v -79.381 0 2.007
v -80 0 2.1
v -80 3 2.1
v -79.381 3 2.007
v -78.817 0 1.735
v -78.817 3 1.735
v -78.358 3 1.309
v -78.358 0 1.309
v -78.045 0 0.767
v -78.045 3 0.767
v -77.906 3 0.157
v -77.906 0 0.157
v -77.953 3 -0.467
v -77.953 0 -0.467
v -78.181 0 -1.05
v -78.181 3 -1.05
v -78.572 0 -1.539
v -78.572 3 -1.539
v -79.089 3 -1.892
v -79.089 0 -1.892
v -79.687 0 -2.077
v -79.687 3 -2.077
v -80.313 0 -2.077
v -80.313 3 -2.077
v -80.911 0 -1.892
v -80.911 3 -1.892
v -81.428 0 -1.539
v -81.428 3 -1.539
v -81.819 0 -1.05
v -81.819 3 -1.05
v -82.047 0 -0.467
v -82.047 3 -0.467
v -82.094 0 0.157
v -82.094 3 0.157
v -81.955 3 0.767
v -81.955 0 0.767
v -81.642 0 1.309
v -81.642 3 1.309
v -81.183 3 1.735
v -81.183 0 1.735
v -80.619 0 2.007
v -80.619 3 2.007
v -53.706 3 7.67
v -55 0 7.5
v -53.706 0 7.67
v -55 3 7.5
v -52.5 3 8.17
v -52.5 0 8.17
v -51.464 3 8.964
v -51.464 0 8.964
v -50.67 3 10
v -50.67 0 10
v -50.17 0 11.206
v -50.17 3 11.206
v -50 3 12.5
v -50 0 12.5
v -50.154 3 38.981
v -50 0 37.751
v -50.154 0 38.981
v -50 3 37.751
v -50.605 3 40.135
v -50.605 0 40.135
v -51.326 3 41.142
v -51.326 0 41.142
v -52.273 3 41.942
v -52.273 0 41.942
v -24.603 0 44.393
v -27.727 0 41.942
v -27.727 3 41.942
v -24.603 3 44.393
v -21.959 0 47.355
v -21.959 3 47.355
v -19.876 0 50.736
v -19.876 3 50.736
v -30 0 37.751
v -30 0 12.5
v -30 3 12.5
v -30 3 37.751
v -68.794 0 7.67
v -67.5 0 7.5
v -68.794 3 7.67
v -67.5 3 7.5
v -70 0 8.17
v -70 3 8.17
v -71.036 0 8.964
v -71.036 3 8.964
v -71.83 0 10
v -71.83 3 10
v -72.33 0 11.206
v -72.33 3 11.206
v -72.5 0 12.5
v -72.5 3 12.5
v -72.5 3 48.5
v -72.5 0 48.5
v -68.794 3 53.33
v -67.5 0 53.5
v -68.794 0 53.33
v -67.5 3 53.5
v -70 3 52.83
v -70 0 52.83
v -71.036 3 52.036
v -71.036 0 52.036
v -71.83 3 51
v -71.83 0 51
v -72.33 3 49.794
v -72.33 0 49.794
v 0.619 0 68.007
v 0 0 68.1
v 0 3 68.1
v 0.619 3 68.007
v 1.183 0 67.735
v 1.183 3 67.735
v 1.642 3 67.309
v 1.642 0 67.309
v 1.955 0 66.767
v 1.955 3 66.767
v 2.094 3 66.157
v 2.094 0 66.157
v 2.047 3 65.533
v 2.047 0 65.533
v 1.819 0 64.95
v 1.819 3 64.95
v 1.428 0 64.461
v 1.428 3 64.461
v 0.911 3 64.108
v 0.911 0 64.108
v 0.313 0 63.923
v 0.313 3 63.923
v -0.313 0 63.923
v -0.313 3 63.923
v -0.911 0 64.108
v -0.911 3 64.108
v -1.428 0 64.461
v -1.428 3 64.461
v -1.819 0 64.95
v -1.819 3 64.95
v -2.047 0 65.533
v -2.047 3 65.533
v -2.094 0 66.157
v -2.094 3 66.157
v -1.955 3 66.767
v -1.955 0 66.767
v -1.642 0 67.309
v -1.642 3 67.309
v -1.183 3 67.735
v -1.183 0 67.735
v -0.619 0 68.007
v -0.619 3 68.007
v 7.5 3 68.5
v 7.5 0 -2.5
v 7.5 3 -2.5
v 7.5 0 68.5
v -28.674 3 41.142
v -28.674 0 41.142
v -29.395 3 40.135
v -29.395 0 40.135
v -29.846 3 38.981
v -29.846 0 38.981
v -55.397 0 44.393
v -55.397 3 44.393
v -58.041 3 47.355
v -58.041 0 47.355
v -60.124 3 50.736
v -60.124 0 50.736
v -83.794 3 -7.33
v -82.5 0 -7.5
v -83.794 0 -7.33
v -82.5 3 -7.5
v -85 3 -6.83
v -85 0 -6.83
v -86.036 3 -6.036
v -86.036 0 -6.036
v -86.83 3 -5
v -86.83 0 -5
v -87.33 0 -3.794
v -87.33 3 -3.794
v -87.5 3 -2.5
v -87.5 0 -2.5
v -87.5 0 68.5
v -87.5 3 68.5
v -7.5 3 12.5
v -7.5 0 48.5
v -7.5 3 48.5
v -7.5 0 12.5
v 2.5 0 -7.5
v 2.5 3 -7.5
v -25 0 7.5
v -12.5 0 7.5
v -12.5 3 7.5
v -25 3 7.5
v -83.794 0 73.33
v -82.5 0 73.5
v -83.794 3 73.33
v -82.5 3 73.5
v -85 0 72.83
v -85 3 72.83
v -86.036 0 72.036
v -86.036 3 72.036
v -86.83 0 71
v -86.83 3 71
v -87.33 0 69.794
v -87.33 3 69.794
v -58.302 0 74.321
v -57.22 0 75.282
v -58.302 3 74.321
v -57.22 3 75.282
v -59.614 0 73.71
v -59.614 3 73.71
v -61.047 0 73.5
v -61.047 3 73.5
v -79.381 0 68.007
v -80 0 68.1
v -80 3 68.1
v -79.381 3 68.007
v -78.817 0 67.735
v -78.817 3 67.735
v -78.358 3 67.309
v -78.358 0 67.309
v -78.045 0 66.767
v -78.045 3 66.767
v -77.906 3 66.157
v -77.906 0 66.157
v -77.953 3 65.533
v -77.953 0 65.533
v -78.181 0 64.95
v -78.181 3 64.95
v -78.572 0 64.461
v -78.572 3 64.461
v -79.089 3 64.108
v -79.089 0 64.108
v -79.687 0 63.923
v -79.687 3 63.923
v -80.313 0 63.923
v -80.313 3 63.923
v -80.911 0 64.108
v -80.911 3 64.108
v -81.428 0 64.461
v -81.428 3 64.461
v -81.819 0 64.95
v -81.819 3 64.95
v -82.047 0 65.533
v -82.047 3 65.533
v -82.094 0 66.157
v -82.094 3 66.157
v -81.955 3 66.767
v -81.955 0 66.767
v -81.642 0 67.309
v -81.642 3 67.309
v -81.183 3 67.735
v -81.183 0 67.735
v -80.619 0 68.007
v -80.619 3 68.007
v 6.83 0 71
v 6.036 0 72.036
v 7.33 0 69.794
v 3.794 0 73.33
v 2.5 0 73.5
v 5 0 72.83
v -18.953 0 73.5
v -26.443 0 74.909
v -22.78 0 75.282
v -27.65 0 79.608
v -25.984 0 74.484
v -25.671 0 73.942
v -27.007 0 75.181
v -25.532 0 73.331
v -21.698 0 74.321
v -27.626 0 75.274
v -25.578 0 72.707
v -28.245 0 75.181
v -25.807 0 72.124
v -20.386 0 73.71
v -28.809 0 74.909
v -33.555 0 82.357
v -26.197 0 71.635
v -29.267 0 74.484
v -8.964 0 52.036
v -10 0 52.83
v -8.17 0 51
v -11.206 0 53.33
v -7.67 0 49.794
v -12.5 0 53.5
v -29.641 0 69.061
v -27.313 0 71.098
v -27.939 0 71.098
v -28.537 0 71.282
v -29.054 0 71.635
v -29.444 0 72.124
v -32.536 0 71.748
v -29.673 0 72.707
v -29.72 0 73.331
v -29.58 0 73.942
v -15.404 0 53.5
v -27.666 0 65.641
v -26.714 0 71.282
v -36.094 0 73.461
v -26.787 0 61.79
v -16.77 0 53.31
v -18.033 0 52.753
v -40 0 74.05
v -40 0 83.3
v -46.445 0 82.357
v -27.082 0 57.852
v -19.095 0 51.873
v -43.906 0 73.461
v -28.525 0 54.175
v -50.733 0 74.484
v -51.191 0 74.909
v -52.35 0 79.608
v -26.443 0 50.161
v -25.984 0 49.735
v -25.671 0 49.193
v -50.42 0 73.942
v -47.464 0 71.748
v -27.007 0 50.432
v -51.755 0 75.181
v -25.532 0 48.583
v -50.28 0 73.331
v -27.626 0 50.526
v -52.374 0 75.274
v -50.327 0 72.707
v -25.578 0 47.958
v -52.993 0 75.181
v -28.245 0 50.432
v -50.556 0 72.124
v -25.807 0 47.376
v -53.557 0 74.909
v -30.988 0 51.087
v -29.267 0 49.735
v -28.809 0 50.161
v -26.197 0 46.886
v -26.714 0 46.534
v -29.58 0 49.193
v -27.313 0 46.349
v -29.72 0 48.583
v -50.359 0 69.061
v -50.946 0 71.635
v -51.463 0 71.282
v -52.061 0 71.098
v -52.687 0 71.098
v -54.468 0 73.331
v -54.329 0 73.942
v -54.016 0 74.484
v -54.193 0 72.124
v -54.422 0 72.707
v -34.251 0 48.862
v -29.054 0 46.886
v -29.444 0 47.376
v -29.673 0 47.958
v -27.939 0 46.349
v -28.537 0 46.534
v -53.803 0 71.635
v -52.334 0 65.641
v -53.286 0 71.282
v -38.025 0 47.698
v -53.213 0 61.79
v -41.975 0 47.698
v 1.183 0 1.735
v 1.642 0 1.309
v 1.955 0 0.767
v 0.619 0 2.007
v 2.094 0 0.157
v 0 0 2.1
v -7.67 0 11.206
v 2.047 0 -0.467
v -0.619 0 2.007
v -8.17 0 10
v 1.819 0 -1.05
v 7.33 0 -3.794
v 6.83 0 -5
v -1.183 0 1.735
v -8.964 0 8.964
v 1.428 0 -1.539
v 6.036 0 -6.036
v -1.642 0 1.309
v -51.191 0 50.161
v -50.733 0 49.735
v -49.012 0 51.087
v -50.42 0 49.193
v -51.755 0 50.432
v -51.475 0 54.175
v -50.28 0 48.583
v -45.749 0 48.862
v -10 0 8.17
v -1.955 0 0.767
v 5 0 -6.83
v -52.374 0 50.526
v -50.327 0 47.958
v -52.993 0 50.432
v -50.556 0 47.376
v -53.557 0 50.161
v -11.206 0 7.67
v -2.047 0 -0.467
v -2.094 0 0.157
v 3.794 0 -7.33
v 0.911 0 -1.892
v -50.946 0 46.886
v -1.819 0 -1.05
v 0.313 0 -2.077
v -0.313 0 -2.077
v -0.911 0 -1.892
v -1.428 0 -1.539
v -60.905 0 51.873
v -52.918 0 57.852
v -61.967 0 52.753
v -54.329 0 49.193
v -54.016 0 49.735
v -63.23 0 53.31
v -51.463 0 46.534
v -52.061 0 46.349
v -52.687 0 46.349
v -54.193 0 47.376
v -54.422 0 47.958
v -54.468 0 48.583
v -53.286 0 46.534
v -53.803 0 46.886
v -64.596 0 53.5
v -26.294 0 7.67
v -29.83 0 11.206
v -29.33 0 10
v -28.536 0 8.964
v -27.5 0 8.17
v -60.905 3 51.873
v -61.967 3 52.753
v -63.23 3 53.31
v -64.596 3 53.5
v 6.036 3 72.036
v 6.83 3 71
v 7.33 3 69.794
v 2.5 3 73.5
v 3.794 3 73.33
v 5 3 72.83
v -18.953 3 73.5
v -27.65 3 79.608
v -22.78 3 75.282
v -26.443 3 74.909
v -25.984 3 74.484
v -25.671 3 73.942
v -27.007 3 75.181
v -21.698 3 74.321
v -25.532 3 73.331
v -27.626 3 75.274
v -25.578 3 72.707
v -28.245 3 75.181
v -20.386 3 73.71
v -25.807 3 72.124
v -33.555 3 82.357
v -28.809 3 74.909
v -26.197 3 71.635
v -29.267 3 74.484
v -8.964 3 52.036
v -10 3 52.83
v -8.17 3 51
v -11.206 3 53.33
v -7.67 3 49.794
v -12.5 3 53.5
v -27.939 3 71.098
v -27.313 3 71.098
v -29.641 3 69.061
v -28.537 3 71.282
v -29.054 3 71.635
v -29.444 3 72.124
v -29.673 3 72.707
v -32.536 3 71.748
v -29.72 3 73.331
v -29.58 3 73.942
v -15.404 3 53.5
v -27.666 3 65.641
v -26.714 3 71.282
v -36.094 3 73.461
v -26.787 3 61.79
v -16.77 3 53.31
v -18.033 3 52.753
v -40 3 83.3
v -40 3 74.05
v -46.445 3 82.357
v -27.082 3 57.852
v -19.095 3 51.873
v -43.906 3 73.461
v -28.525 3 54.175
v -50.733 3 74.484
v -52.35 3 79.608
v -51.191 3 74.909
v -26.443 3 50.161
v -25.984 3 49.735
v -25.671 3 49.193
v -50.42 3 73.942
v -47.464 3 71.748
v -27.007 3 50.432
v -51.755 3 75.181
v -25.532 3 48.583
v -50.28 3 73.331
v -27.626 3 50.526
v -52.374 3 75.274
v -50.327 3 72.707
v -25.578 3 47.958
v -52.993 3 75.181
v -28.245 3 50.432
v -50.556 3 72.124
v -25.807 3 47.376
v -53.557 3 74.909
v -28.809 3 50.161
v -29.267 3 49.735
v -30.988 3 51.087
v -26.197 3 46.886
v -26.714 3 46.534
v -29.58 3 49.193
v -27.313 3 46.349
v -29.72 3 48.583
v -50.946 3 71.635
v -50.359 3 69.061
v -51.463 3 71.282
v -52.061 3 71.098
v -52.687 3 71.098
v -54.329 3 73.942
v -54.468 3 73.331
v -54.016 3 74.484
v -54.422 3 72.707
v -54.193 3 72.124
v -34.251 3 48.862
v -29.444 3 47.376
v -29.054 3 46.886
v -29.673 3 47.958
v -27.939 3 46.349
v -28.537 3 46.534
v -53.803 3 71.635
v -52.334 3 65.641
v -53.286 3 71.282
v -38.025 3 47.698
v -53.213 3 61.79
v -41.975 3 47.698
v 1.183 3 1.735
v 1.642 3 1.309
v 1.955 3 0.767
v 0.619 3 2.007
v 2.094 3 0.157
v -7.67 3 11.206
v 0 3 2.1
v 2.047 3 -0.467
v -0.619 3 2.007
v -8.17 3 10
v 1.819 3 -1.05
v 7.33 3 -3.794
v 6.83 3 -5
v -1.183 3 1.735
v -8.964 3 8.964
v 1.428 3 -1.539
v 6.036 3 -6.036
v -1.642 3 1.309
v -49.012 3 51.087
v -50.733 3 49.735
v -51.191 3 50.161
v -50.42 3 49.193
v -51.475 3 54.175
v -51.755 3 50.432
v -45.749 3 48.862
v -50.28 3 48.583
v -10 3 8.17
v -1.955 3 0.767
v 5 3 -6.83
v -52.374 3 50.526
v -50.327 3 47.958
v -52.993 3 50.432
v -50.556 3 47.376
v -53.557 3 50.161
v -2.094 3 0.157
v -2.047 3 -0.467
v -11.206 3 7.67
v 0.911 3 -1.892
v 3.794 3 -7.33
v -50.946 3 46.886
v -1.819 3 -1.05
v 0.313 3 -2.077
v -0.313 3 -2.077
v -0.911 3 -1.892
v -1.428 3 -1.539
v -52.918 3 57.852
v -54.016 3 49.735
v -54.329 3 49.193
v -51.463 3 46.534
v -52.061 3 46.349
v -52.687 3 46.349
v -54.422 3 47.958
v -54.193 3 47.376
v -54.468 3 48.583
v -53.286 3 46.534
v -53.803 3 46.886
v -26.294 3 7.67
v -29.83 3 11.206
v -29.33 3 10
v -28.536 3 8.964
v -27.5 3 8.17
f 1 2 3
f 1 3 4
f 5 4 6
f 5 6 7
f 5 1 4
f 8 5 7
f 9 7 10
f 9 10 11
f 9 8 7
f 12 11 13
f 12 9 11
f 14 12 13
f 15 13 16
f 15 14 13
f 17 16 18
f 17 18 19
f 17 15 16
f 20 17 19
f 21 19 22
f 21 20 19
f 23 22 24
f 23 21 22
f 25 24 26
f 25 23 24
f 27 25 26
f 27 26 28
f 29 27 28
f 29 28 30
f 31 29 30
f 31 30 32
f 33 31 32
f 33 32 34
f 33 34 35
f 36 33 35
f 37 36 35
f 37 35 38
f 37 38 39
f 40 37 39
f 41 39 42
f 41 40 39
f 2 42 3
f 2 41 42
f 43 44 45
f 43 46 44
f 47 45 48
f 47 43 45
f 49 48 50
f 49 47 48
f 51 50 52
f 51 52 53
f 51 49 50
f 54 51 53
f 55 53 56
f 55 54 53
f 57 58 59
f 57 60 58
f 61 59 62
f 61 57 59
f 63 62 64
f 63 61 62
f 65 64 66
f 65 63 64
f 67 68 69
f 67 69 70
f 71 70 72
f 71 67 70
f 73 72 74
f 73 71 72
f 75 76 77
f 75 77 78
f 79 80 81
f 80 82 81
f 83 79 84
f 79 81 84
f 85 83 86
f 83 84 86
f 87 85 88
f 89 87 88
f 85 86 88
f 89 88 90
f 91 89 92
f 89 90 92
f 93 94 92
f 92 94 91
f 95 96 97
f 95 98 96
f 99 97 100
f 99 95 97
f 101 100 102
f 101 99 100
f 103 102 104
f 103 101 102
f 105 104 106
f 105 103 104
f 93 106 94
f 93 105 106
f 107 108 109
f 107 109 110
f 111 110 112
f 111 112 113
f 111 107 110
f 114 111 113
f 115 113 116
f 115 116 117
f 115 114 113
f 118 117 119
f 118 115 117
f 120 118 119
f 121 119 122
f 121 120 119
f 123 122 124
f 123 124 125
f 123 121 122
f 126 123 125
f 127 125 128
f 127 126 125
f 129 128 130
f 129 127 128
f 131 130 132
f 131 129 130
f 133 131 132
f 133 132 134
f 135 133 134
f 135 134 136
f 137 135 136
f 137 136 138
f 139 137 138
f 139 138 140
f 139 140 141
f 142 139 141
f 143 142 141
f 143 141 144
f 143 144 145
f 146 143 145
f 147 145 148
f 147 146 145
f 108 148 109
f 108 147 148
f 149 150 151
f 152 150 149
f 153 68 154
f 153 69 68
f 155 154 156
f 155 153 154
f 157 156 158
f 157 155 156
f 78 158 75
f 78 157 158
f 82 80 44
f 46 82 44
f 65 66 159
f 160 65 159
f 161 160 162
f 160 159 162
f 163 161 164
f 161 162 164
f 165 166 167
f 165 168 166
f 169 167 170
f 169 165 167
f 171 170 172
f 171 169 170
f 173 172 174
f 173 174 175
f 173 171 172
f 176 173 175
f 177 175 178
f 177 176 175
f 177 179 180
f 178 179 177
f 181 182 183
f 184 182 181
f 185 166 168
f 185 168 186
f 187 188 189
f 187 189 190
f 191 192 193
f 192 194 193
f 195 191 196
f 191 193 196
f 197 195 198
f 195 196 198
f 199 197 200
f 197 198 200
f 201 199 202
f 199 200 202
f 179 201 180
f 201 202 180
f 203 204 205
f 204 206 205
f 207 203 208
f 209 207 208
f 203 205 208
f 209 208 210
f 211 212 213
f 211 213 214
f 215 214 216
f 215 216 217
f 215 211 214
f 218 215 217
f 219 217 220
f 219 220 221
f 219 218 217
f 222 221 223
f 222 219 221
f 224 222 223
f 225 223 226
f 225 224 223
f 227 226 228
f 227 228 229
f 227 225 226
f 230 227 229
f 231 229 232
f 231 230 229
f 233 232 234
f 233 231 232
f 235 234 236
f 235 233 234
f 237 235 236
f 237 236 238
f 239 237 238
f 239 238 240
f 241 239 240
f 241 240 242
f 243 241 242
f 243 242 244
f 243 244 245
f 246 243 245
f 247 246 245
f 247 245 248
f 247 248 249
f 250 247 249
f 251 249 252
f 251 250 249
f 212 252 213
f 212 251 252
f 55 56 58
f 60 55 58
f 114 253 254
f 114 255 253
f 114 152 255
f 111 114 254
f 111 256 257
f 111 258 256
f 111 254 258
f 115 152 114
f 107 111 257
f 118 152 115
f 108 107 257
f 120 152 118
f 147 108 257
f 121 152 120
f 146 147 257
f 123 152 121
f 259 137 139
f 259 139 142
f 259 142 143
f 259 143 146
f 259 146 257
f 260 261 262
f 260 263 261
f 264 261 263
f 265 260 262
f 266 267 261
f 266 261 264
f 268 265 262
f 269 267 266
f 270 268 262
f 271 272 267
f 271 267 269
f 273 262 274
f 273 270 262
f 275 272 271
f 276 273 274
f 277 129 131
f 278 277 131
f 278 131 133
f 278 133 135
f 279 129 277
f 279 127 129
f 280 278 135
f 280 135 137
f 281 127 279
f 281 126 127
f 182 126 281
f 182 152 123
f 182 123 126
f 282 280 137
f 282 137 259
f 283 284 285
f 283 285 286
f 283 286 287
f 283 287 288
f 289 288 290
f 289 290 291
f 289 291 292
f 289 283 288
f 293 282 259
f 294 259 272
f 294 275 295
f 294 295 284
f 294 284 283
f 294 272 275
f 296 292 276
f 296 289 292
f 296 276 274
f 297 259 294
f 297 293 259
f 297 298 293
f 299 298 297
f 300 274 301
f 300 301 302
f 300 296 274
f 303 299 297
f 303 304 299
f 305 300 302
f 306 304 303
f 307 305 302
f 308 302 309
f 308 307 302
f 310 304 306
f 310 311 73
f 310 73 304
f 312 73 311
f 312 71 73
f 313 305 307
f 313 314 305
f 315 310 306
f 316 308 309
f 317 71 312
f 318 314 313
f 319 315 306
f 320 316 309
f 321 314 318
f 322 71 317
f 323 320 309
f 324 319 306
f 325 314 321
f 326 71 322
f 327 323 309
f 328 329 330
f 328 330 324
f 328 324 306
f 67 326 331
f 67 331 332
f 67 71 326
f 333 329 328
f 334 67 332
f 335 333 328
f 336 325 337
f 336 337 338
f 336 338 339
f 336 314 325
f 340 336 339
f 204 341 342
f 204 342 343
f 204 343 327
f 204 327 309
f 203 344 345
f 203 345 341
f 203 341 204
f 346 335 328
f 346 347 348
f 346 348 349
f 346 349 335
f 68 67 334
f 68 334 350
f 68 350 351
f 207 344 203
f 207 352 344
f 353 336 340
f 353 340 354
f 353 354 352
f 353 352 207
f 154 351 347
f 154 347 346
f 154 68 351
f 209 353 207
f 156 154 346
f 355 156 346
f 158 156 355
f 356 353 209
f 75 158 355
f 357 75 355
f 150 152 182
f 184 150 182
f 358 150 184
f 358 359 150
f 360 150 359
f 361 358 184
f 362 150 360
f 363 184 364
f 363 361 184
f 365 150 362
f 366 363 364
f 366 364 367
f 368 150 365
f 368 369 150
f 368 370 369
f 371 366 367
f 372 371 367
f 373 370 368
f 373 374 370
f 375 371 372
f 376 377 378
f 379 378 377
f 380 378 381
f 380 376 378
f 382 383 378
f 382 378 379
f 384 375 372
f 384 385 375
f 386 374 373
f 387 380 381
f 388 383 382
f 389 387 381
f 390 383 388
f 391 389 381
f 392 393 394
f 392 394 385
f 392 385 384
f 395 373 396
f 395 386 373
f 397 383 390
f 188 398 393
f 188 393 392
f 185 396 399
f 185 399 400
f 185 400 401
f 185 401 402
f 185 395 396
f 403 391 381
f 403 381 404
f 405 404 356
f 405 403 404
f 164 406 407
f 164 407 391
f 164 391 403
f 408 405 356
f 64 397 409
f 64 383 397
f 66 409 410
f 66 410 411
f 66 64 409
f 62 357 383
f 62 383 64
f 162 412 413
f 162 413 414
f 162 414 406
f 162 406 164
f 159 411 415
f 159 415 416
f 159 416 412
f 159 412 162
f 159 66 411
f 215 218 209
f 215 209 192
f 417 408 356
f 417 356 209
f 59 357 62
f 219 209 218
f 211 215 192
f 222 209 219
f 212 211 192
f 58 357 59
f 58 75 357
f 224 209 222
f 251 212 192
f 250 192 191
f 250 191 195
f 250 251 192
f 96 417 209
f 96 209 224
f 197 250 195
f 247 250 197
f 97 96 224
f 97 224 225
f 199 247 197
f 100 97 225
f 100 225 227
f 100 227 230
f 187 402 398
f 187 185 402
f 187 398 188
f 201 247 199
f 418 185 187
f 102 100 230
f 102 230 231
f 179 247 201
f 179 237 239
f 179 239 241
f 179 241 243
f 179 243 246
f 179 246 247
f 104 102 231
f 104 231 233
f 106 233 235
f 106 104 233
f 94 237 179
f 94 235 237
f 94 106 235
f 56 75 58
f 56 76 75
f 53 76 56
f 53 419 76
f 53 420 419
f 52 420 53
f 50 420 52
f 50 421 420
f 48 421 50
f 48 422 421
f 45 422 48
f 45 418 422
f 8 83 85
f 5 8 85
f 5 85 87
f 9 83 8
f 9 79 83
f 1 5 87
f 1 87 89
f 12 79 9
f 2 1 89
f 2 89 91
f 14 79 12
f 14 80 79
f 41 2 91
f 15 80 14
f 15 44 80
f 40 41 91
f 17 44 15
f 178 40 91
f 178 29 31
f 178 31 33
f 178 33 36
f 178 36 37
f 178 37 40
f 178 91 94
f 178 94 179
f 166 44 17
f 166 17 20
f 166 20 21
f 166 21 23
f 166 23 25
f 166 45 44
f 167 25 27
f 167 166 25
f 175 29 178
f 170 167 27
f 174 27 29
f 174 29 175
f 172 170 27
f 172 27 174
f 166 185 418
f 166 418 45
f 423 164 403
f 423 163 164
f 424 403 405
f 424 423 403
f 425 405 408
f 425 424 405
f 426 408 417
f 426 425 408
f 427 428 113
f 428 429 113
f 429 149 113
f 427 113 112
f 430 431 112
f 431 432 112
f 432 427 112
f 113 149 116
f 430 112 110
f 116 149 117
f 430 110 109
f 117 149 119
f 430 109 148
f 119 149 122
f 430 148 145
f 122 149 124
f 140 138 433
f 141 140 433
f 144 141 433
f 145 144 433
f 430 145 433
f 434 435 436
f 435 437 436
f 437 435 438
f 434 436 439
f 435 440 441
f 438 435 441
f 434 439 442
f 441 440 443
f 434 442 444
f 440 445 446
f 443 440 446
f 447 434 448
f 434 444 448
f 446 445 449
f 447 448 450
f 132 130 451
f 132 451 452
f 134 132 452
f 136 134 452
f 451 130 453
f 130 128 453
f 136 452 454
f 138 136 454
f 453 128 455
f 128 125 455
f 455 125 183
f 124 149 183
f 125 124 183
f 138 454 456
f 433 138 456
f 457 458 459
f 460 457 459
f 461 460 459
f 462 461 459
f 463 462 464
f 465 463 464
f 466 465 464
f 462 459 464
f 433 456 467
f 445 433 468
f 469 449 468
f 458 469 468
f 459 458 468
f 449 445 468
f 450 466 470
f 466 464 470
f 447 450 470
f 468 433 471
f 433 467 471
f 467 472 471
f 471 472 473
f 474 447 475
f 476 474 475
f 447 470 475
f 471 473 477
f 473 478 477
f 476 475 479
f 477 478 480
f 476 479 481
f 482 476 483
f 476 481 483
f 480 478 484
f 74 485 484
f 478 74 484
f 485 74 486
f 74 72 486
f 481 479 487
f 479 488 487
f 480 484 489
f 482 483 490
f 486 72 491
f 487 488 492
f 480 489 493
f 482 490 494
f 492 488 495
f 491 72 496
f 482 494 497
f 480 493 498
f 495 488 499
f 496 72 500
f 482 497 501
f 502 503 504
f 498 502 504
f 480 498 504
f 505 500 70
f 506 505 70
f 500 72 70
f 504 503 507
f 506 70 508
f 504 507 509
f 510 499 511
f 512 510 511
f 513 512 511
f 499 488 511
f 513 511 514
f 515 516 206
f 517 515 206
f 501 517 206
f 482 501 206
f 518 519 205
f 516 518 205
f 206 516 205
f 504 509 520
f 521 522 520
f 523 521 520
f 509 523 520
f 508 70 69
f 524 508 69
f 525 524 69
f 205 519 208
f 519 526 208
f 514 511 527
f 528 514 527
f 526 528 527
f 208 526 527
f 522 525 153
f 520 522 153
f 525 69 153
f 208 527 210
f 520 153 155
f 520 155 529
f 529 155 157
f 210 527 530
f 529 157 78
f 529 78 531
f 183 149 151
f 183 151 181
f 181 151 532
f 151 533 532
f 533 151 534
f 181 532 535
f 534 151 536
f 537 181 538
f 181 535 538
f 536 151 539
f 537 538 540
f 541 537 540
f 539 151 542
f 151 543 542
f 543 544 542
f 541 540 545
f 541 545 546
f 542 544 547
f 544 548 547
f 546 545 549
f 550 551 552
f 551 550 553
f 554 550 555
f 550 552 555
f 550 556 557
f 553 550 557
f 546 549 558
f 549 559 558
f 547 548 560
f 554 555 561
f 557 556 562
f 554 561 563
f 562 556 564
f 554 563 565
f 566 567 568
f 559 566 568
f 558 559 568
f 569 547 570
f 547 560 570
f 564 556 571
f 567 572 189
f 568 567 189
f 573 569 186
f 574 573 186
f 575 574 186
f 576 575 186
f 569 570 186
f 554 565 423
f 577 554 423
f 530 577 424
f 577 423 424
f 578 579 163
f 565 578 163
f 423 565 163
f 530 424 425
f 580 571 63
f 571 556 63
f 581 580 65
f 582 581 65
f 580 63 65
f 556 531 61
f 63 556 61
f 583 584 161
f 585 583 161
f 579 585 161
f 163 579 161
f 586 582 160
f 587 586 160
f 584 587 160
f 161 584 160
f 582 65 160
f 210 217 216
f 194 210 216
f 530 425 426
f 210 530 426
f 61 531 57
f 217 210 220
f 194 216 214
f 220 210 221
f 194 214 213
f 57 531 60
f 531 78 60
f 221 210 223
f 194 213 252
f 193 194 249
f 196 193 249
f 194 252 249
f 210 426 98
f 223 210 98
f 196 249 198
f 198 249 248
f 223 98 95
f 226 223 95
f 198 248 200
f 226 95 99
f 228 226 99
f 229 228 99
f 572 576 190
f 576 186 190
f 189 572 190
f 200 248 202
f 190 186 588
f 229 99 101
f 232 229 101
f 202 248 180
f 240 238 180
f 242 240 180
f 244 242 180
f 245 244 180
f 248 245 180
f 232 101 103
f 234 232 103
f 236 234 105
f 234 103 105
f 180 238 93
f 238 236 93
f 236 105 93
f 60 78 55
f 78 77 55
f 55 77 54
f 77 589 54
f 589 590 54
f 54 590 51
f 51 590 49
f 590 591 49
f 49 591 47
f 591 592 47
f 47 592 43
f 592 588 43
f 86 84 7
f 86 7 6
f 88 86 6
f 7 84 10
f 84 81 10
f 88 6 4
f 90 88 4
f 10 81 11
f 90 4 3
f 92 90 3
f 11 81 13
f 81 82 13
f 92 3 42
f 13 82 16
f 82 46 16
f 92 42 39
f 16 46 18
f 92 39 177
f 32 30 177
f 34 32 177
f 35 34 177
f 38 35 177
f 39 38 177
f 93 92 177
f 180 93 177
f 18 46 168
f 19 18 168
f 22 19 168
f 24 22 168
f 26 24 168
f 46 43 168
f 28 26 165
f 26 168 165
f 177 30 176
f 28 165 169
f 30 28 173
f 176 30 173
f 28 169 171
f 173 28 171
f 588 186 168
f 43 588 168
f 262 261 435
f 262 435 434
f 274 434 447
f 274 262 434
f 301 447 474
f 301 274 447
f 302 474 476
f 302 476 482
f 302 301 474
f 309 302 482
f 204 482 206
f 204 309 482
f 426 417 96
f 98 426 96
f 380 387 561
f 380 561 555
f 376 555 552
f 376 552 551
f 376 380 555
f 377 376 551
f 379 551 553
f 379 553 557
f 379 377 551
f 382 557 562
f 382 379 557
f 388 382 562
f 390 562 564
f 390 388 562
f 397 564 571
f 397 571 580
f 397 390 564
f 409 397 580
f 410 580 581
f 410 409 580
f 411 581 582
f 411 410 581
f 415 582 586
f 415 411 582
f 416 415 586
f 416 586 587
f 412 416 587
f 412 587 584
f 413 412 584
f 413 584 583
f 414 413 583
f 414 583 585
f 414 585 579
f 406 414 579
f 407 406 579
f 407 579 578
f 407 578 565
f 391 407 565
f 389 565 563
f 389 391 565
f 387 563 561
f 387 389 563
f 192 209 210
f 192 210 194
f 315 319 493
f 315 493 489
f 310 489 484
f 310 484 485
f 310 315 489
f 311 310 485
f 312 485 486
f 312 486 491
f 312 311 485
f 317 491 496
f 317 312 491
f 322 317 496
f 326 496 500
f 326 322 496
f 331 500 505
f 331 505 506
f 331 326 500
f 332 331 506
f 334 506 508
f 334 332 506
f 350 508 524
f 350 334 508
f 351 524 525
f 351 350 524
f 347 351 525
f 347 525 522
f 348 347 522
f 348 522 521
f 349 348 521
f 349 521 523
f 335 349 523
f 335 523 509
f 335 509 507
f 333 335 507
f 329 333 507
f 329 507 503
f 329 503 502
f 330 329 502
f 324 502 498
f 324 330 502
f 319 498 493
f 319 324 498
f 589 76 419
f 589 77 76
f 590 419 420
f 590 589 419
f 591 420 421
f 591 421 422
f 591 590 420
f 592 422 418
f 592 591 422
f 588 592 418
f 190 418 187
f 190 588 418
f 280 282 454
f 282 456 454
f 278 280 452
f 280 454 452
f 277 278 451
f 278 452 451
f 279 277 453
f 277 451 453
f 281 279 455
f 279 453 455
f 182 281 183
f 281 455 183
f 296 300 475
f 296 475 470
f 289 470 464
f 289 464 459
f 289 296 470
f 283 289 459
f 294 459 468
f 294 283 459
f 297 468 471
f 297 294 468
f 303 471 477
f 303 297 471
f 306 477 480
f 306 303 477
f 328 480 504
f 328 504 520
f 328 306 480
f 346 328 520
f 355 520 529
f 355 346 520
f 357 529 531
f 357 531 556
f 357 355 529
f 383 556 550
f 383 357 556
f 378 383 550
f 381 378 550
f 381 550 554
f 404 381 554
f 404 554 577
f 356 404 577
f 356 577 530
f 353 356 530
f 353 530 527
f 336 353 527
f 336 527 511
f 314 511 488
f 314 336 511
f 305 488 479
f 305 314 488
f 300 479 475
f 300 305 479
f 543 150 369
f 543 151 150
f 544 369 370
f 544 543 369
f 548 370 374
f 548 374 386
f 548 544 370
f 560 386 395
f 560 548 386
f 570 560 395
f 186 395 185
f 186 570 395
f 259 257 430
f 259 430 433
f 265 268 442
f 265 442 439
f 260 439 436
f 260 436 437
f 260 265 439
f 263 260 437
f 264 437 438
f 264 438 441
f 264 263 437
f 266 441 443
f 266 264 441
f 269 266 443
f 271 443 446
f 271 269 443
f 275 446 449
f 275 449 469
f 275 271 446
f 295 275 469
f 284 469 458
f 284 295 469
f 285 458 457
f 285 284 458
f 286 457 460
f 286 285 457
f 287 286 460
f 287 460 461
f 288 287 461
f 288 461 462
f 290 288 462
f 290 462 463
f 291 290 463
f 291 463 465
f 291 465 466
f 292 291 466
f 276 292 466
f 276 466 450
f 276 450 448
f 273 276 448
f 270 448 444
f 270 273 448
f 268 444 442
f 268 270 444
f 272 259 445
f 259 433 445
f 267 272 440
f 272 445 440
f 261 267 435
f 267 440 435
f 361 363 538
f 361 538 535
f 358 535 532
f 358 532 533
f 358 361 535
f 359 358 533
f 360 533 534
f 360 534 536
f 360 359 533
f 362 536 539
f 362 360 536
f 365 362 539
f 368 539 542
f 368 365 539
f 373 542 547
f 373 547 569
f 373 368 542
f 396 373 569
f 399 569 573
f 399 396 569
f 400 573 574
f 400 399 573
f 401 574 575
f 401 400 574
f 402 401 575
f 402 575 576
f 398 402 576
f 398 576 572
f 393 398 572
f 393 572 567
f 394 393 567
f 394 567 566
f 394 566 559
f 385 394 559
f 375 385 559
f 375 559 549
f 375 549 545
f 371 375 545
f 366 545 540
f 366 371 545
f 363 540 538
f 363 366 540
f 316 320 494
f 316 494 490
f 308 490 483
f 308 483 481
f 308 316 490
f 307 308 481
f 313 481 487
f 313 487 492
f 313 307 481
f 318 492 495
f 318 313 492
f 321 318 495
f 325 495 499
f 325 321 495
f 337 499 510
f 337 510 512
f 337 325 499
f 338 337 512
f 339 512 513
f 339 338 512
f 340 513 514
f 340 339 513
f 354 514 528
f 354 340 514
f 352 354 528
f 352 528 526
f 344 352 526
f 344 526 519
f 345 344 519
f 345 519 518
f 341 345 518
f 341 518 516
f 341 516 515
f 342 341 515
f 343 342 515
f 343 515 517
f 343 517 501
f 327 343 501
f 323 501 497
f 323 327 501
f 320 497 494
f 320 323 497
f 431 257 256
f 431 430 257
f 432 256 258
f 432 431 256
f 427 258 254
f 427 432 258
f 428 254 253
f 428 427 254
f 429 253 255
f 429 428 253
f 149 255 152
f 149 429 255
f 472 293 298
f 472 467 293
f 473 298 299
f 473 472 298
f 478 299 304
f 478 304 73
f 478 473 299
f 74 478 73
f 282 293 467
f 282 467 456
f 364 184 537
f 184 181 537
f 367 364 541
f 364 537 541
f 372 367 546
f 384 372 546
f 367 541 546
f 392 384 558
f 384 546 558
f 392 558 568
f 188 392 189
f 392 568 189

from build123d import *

# Parameters (mm, degrees)
SKETCH_1_R      = 2.1
EXTRUDE_1_DEPTH = 3
FILLET_1_R      = 5
FILLET_2_R      = 5


with BuildPart() as part:
    # ｽｹｯﾁ1 → ﾎﾞｽ - 押し出し1 (new body)
    with BuildSketch(Plane(origin=(0, 0, 0), x_dir=(1, 0, 0), z_dir=(0, 1, 0))):
        with BuildLine():
            Line((-18.109134325, -73.5), (7.5, -73.5))
            Line((7.5, -73.5), (7.5, 7.5))
            Line((7.5, 7.5), (-40, 7.5))
            Line((-40, 7.5), (-87.5, 7.5))
            Line((-87.5, 7.5), (-87.5, -73.5))
            Line((-87.5, -73.5), (-61.890865675, -73.5))
            Line((-61.890865675, -73.5), (-58.573098826, -73.5))
            ThreePointArc((-58.573098826, -73.5), (-40, -83.3), (-21.426901174, -73.5))
            Line((-21.426901174, -73.5), (-18.109134325, -73.5))
        make_face()
        with Locations((-80, -66)):
            Circle(SKETCH_1_R, mode=Mode.SUBTRACT)
        with BuildLine():
            ThreePointArc((-50.274368671, -73.174368671), (-50.280728356, -73.337678908), (-50.299768893, -73.5))
            ThreePointArc((-50.299768893, -73.5), (-54.468008985, -73.011058434), (-50.274368671, -73.174368671))
        make_face(mode=Mode.SUBTRACT)
        with Locations((-52.374368671, -48.425631329)):
            Circle(SKETCH_1_R, mode=Mode.SUBTRACT)
        with BuildLine():
            ThreePointArc((-25.525631329, -73.174368671), (-27.462321092, -75.268008985), (-29.700231107, -73.5))
            ThreePointArc((-29.700231107, -73.5), (-27.788941566, -71.080728356), (-25.525631329, -73.174368671))
        make_face(mode=Mode.SUBTRACT)
        with BuildLine():
            ThreePointArc((-36.22210376, -73.5), (-40, -74.05), (-43.77789624, -73.5))
            ThreePointArc((-43.77789624, -73.5), (-47.921659385, -50.178803618), (-26.75, -60.8))
            ThreePointArc((-26.75, -60.8), (-29.378803618, -68.721659385), (-36.22210376, -73.5))
        make_face(mode=Mode.SUBTRACT)
        with Locations((0, -66)):
            Circle(SKETCH_1_R, mode=Mode.SUBTRACT)
        with Locations((-27.625631329, -48.425631329)):
            Circle(SKETCH_1_R, mode=Mode.SUBTRACT)
        with BuildLine():
            Line((-72.5, -53.5), (-72.5, -7.5))
            Line((-72.5, -7.5), (-50, -7.5))
            Line((-50, -7.5), (-50, -40.644355629))
            ThreePointArc((-50, -40.644355629), (-56.910682506, -45.958207076), (-61.282856951, -53.5))
            Line((-61.282856951, -53.5), (-72.5, -53.5))
        make_face(mode=Mode.SUBTRACT)
        with Locations((-80, 0)):
            Circle(SKETCH_1_R, mode=Mode.SUBTRACT)
        with BuildLine():
            Line((-7.5, -7.5), (-7.5, -53.5))
            Line((-7.5, -53.5), (-18.717143049, -53.5))
            ThreePointArc((-18.717143049, -53.5), (-23.089317494, -45.958207076), (-30, -40.644355629))
            Line((-30, -40.644355629), (-30, -7.5))
            Line((-30, -7.5), (-7.5, -7.5))
        make_face(mode=Mode.SUBTRACT)
        Circle(SKETCH_1_R, mode=Mode.SUBTRACT)
    extrude(amount=EXTRUDE_1_DEPTH)

    # ﾌｨﾚｯﾄ1
    fillet_1_edges = [part.edges().sort_by_distance(p)[0] for p in [
        (-30, 1.5, 40.644355629),
        (-7.5, 1.5, 7.5),
        (-30, 1.5, 7.5),
        (-50, 1.5, 7.5),
        (-50, 1.5, 40.644355629),
        (-72.5, 1.5, 7.5),
        (-7.5, 1.5, 53.5),
        (-18.717143049, 1.5, 53.5),
        (-61.282856951, 1.5, 53.5),
        (-72.5, 1.5, 53.5),
    ]]
    fillet(fillet_1_edges, radius=FILLET_1_R)

    # ﾌｨﾚｯﾄ2
    fillet_2_edges = [part.edges().sort_by_distance(p)[0] for p in [
        (-87.5, 1.5, -7.5),
        (7.5, 1.5, -7.5),
        (7.5, 1.5, 73.5),
        (-87.5, 1.5, 73.5),
        (-21.426901174, 1.5, 73.5),
        (-58.573098826, 1.5, 73.5),
    ]]
    fillet(fillet_2_edges, radius=FILLET_2_R)


solid = part.part
